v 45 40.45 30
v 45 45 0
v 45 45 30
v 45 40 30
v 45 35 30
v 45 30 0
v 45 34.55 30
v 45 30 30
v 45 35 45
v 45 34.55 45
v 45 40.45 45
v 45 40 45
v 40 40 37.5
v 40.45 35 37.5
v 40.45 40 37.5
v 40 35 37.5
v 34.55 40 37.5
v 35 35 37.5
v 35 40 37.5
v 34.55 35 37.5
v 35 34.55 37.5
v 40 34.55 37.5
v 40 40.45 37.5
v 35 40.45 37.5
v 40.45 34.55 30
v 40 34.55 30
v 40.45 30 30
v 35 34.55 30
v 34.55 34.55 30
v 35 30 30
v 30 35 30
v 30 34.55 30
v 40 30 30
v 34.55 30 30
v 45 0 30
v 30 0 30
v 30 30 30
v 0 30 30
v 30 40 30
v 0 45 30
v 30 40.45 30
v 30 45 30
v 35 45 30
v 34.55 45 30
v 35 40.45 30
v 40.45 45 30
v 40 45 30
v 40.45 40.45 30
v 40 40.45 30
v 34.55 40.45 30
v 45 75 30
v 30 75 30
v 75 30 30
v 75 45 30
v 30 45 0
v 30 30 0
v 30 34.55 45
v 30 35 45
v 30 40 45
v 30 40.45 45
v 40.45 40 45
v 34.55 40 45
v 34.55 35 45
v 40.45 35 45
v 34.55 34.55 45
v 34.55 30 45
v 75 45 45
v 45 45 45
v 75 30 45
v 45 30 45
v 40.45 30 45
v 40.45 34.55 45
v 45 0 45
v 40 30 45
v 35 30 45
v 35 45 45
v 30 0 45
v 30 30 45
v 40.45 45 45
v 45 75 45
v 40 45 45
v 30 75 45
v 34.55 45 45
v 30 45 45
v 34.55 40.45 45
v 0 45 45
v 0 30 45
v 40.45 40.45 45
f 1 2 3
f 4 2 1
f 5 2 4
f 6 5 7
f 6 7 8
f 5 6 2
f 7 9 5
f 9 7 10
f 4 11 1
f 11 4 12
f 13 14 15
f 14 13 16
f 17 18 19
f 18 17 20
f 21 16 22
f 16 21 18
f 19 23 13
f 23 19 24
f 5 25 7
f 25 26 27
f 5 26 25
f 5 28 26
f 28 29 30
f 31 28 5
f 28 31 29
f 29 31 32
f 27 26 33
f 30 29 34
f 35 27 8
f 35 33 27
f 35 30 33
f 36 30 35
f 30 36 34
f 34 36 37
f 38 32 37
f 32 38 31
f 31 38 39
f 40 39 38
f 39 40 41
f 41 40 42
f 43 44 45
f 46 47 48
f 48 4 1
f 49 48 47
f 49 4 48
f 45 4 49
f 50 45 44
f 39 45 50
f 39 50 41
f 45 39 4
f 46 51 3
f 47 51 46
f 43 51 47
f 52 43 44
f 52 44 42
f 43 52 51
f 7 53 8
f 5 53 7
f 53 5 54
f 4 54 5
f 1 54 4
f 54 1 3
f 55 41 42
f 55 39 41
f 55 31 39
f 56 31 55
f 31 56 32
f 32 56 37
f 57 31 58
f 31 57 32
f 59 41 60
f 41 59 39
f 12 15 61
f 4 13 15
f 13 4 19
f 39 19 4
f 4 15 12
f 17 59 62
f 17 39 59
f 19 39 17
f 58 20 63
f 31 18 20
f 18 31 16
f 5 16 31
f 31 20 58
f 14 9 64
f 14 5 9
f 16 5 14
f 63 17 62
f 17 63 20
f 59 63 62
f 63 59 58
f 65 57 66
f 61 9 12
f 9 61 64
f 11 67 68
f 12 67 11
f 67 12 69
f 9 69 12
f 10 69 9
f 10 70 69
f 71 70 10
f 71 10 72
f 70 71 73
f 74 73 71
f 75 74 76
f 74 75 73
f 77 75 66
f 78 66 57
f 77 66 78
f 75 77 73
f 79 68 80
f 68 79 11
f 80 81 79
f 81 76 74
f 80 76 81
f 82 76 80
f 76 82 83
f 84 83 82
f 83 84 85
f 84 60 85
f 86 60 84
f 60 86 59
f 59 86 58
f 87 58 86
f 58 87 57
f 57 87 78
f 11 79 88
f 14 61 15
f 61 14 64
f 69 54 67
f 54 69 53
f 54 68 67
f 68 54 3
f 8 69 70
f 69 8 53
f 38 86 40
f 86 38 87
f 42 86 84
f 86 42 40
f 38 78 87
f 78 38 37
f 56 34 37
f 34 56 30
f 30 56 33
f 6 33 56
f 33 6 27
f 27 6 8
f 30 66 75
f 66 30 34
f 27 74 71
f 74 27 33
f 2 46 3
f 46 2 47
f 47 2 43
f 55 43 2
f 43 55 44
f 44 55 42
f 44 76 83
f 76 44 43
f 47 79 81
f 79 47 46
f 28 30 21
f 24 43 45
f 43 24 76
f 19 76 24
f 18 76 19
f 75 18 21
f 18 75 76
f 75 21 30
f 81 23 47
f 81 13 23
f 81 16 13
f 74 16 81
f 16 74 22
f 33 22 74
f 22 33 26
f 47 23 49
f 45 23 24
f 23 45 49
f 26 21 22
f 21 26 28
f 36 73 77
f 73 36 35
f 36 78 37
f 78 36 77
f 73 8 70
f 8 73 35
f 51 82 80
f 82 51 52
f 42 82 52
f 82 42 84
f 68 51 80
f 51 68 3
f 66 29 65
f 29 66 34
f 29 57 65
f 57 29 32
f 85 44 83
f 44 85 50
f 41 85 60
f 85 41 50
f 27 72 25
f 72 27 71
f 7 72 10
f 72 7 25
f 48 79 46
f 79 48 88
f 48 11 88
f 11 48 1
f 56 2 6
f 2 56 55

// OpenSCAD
// 井桁仕口

size=15;
leeway=size*0.03;

function x_leeway(leeway) = [leeway, 0, 0];
function y_leeway(leeway) = [0, leeway, 0];
function z_leeway(leeway) = [0, 0, leeway];
function xy_leeway(leeway) = x_leeway(leeway) + y_leeway(leeway);
function xz_leeway(leeway) = x_leeway(leeway) + z_leeway(leeway);
function yz_leeway(leeway) = y_leeway(leeway) + z_leeway(leeway);
function xyz_leeway(leeway) = x_leeway(leeway) + y_leeway(leeway) + z_leeway(leeway);

module x_bar() {
    cube([size*2, size, size]);
    translate([size*2, 0, 0]) {
        translate([0, size/3, 0]) cube([size, size/3, size/2]);
        translate([0, size/3, size/2]) cube([size/3, size/3, size/2]-x_leeway(leeway));
        translate([size*2/3, size/3, size/2]+x_leeway(leeway)) cube([size/3, size/3, size/2]-x_leeway(leeway));
        translate([size, 0, 0]) cube([size*2, size, size]);
    }
}

module y_bar() {
    // y_bar is identical to x_bar, except it's rotated.
    translate([size, size*5, size]) rotate([0, 180, 90]) x_bar();
}

module z_bar() {
    cube([size, size, size*2]);
    translate([0, 0, size*2])
        for(xloc=[0, size*2/3+leeway]) {
            for(yloc=[0, size*2/3+leeway]) {
                translate([xloc, yloc, 0])
                    cube([size/3, size/3, size]-xy_leeway(leeway));
            }
        }
}

color("Red", 1)   translate([0, size*2, size*2]) x_bar();
color("Green", 1) translate([size*2, 0, size*2]) y_bar();
color("Blue", 1)  translate([size*2, size*2, 0]) z_bar();
